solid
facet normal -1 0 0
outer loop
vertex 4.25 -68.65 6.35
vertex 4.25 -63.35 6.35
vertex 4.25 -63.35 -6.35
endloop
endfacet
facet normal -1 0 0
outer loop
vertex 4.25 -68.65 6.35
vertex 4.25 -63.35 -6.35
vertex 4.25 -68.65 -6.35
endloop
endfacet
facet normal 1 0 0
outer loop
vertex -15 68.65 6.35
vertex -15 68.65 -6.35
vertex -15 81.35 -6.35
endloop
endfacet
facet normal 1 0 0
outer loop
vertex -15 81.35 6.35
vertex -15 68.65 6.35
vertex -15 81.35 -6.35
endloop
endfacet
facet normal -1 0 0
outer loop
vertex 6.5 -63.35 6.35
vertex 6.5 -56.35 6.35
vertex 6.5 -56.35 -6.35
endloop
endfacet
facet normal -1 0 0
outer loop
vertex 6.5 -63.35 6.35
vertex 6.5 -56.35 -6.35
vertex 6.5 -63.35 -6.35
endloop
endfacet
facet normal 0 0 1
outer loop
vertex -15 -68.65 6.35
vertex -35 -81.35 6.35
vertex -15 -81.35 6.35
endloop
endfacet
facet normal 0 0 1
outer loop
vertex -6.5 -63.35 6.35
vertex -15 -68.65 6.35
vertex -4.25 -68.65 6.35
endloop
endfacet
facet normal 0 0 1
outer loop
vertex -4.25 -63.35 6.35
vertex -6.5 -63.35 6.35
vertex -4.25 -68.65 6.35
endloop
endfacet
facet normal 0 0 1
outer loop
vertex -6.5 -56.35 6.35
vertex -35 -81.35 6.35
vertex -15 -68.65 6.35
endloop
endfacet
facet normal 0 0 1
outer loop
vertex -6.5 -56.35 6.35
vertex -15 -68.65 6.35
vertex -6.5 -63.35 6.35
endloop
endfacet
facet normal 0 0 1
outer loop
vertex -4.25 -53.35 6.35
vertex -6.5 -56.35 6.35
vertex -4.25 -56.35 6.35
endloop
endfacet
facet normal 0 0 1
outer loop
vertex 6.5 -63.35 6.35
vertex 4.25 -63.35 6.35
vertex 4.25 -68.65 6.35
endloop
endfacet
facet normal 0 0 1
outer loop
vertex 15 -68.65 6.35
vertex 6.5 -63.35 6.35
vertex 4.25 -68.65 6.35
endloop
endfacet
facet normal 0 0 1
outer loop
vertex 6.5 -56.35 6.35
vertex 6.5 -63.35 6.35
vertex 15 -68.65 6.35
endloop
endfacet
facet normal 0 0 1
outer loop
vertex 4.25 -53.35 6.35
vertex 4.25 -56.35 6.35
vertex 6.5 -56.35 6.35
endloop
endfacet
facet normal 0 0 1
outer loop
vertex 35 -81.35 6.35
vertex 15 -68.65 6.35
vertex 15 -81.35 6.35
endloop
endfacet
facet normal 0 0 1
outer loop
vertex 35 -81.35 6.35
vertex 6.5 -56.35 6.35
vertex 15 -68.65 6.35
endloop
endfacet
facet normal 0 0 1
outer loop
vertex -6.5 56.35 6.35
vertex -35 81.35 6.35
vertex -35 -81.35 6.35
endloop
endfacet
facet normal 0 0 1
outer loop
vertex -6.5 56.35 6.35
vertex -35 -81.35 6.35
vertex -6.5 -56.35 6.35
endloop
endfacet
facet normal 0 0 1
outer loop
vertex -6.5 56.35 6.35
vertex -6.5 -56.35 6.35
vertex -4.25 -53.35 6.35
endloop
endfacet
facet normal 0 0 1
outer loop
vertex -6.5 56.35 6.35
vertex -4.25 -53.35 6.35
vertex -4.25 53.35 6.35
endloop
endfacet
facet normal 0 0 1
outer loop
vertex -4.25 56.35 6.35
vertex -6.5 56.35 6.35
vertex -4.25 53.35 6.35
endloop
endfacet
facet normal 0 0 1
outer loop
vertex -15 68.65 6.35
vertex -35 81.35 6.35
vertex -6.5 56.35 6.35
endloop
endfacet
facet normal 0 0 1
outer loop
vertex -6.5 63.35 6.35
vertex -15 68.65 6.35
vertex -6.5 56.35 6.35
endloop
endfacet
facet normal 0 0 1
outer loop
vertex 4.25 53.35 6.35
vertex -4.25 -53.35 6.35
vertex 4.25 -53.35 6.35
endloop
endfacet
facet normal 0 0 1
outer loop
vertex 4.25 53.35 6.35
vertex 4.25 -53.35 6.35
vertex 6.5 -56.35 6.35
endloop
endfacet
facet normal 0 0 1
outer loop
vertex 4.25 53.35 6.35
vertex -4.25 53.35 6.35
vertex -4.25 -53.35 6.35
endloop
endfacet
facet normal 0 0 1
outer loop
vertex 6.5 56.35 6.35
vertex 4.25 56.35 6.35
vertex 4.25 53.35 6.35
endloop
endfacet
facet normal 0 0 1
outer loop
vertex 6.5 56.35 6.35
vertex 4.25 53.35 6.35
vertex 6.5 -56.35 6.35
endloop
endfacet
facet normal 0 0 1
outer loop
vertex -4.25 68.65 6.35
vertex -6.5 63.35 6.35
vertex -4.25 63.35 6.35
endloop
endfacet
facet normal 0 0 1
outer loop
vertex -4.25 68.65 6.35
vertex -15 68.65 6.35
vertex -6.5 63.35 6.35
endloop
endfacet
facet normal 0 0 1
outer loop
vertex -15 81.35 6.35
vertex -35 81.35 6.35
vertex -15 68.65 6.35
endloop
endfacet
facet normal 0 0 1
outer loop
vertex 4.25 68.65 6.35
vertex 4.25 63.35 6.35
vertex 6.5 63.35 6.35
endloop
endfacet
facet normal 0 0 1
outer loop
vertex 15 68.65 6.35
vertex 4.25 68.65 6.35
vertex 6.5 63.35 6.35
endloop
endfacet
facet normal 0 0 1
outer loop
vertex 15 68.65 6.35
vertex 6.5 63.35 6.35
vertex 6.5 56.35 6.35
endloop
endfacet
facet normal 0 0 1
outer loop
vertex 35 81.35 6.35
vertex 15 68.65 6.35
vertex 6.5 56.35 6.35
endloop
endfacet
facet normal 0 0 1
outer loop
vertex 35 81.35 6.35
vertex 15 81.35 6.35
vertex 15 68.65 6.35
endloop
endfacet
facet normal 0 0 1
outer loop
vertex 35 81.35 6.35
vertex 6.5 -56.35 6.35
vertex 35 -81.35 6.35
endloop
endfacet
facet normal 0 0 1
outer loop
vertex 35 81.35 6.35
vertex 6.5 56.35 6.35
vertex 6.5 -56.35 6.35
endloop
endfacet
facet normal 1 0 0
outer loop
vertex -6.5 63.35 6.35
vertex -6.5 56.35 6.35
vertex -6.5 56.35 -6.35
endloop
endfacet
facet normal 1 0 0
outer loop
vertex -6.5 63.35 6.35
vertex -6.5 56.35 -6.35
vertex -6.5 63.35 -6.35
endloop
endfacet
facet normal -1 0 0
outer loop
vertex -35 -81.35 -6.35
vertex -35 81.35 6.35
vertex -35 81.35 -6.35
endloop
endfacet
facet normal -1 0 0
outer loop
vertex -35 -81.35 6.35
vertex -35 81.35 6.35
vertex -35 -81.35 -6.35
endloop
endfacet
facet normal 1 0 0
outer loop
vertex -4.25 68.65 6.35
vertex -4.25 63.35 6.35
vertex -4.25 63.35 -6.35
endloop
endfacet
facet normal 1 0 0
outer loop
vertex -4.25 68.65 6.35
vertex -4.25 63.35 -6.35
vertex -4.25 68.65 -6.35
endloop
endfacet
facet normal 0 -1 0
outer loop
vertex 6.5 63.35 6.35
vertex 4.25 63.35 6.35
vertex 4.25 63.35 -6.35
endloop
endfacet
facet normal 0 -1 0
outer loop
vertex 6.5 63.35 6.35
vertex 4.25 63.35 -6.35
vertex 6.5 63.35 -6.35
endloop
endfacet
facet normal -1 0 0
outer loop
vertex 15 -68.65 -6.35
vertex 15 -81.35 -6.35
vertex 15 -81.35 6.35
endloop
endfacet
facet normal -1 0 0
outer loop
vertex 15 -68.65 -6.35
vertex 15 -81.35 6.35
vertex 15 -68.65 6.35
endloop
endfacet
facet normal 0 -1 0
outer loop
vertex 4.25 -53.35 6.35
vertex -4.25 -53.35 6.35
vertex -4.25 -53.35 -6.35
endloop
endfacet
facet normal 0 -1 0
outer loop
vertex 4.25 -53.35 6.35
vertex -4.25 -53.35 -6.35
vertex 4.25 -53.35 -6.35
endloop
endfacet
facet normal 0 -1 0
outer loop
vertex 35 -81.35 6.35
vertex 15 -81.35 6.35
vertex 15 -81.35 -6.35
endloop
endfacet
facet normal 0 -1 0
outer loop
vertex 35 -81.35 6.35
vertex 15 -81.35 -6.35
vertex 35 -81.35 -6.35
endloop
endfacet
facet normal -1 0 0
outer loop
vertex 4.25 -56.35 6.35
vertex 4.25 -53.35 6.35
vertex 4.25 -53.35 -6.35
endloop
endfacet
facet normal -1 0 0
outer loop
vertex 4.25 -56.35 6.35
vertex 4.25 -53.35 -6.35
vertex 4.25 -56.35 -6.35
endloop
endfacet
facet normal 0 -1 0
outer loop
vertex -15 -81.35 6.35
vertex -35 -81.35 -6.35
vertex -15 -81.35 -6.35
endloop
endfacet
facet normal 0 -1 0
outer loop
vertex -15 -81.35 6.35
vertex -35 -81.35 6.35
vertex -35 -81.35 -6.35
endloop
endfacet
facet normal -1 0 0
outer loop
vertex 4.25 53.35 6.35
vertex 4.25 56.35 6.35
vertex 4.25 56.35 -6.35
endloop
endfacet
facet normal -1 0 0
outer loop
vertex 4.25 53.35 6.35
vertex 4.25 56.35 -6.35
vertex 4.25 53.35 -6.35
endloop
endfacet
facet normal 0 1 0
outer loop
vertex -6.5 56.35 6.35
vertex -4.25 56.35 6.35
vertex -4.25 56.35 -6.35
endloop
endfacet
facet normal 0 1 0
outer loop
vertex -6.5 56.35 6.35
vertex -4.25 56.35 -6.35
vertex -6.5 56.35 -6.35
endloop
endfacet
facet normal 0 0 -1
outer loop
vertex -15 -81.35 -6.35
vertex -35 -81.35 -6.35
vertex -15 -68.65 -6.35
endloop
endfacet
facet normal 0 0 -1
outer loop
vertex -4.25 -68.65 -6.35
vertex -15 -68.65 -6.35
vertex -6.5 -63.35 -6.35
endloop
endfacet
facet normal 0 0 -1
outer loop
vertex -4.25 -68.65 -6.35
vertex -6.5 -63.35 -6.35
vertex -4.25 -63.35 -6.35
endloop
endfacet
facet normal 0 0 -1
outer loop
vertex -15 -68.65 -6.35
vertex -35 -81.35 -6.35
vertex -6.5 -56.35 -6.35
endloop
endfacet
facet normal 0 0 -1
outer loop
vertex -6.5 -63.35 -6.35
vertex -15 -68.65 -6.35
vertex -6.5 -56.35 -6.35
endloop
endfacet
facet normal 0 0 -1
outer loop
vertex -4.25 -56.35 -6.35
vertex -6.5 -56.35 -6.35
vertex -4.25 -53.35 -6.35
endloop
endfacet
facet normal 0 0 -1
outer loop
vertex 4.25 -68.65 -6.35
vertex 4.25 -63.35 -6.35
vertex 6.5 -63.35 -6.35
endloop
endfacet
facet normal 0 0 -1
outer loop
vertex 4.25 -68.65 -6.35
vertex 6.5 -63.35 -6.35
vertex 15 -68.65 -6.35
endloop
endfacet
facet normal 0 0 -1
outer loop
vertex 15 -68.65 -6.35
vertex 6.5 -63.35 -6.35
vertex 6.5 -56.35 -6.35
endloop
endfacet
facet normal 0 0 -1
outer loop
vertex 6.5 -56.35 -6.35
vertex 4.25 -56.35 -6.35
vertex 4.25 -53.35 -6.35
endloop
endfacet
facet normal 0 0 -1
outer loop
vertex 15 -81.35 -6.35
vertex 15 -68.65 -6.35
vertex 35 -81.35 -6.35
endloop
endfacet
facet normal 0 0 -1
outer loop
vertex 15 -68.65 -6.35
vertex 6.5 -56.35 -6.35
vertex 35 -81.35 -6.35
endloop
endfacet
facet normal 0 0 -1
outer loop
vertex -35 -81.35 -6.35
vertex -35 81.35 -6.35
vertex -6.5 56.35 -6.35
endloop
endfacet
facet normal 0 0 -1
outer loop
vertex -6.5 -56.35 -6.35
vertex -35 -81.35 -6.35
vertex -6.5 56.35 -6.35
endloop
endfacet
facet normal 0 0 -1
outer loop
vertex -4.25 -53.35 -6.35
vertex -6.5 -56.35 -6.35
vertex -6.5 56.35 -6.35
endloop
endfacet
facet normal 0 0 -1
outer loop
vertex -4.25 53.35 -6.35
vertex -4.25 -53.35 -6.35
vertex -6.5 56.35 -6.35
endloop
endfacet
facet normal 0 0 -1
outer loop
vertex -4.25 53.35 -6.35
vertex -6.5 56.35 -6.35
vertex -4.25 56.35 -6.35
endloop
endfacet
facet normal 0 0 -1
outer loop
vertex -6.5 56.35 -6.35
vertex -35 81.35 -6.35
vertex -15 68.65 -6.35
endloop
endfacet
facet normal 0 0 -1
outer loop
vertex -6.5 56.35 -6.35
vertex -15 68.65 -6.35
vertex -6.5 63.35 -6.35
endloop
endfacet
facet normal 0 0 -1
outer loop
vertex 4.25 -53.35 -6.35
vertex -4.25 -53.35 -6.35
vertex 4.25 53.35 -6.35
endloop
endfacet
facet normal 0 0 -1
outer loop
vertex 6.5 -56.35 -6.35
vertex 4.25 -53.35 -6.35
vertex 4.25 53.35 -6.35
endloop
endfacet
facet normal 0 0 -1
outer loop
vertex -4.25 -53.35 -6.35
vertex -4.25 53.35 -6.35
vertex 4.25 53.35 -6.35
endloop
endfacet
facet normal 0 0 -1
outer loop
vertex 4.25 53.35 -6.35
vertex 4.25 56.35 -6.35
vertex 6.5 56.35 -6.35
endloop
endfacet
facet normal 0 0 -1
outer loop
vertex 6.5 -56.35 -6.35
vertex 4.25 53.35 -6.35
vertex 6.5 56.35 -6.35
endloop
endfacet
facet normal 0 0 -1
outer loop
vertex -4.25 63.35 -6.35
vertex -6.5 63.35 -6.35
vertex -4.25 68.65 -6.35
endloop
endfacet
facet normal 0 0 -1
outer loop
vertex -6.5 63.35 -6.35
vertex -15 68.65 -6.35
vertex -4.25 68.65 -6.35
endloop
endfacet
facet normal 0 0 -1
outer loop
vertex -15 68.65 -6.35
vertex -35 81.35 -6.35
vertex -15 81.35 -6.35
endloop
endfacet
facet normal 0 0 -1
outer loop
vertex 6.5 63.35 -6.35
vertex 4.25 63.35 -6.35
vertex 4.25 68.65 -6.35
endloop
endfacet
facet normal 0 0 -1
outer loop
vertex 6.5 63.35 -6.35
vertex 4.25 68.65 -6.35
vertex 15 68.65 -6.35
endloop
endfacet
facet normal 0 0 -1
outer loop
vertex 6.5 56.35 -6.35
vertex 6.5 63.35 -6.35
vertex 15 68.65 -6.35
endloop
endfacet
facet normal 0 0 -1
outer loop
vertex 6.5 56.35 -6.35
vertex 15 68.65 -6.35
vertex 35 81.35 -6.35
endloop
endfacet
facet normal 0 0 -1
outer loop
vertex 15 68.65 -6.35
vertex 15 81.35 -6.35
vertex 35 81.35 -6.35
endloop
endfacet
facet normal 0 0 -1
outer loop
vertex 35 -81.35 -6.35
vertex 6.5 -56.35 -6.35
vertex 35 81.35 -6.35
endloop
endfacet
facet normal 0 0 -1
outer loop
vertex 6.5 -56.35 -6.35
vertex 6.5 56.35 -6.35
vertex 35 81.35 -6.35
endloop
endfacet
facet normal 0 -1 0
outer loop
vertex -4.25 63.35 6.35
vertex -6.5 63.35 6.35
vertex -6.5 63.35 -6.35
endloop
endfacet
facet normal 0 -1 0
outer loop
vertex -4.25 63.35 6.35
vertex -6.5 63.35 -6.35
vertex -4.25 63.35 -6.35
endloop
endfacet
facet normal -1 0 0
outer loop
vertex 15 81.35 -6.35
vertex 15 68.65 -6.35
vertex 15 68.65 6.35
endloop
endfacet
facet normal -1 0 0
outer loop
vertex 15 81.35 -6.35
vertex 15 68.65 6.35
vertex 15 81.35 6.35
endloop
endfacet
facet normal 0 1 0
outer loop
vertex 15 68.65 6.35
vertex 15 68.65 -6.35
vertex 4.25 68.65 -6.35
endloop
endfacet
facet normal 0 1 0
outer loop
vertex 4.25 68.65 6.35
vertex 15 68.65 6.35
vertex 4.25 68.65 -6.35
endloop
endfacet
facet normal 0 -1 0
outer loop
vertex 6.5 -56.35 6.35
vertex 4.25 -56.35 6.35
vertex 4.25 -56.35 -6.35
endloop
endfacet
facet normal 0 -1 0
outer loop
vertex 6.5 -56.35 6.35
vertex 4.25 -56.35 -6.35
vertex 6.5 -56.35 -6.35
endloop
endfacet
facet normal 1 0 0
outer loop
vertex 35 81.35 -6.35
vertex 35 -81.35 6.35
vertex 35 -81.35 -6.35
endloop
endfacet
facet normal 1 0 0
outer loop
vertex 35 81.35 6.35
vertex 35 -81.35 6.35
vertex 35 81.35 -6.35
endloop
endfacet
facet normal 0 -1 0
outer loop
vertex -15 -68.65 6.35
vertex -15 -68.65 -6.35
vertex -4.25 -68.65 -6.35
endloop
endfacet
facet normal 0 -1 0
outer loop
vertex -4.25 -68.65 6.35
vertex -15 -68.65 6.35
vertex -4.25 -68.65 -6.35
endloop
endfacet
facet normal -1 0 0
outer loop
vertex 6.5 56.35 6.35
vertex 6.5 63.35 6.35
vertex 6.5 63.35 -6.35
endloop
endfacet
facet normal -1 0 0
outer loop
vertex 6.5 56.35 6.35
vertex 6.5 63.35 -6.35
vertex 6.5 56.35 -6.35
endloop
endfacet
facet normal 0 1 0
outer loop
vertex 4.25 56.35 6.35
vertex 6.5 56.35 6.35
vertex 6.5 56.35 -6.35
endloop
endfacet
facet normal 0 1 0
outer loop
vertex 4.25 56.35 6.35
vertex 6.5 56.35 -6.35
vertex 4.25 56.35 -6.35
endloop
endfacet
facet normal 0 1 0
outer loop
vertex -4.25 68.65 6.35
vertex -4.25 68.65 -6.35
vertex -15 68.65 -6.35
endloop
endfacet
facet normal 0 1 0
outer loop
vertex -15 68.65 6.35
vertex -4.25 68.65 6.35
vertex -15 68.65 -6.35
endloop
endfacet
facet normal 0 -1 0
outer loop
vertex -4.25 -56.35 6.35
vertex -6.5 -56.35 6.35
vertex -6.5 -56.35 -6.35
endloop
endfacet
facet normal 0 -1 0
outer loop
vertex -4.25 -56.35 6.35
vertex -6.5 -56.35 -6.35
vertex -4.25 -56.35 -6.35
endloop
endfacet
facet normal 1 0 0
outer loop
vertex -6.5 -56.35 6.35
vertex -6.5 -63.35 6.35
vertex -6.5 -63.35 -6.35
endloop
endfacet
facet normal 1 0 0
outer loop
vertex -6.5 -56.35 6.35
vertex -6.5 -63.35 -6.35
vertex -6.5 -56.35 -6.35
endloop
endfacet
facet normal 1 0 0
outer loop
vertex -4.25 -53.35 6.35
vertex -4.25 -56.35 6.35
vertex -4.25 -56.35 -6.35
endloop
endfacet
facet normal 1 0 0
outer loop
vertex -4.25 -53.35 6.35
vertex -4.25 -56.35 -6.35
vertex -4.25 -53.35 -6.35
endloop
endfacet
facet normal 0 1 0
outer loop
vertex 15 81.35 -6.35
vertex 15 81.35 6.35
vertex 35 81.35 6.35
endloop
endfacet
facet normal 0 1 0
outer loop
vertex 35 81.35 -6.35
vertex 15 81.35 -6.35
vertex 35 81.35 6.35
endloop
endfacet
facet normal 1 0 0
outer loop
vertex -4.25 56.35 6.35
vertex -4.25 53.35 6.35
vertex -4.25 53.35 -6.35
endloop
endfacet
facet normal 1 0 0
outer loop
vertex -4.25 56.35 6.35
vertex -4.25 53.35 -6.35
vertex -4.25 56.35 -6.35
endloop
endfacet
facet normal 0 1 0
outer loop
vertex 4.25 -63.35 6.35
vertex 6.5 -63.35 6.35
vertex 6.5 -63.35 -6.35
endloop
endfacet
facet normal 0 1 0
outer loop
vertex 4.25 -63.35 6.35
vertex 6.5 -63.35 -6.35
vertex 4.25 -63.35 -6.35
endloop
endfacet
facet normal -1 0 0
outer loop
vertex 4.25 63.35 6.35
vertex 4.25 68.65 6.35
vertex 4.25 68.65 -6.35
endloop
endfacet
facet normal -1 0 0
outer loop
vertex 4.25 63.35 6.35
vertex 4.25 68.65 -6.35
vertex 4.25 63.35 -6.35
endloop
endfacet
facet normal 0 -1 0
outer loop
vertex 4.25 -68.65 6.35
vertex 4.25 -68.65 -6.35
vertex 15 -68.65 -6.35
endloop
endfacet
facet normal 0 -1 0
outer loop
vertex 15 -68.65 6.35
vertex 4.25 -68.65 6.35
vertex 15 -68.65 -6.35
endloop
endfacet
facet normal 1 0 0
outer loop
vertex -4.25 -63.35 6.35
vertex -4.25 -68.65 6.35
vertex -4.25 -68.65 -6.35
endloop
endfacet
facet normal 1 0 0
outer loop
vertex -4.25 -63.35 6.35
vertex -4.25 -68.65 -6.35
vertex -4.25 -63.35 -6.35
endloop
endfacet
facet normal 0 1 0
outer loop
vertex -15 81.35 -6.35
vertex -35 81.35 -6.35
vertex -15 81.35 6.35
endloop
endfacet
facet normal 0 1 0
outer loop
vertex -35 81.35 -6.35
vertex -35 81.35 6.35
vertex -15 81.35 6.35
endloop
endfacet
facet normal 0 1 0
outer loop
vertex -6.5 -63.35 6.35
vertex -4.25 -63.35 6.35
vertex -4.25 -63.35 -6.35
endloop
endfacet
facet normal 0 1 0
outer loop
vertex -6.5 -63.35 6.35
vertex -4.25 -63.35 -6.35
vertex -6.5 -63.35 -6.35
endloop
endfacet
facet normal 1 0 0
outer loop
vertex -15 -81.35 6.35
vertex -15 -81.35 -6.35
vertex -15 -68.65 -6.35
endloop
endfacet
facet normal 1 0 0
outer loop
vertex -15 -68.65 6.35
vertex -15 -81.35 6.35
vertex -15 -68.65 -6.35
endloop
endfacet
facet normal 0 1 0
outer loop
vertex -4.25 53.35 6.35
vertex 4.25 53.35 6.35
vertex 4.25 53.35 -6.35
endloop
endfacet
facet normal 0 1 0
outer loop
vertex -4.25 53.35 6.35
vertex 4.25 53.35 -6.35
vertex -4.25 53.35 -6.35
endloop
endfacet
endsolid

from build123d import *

# Parameters (mm, degrees)
SKETCH1_W           = 20
SKETCH1_H           = 12.7
BOSS_EXTRUDE1_DEPTH = 6.35


with BuildPart() as part:
    # Sketch1 → Boss-Extrude1 (new, symmetric)
    with BuildSketch(Plane.XY):
        Polygon((-35, 68.65), (-35, -68.65), (-15, -68.65), (-4.25, -68.65), (-4.25, -63.35), (-6.5, -63.35), (-6.5, -56.35), (-4.25, -56.35), (-4.25, -53.35), (4.25, -53.35), (4.25, -56.35), (6.5, -56.35), (6.5, -63.35), (4.25, -63.35), (4.25, -68.65), (15, -68.65), (35, -68.65), (35, 68.65), (15, 68.65), (4.25, 68.65), (4.25, 63.35), (6.5, 63.35), (6.5, 56.35), (4.25, 56.35), (4.25, 53.35), (-4.25, 53.35), (-4.25, 56.35), (-6.5, 56.35), (-6.5, 63.35), (-4.25, 63.35), (-4.25, 68.65), (-15, 68.65), align=None)
        with Locations((-25, -75)):
            Rectangle(SKETCH1_W, SKETCH1_H)
        with Locations((25, -75)):
            Rectangle(SKETCH1_W, SKETCH1_H)
        with Locations((25, 75)):
            Rectangle(SKETCH1_W, SKETCH1_H)
        with Locations((-25, 75)):
            Rectangle(SKETCH1_W, SKETCH1_H)
    extrude(amount=BOSS_EXTRUDE1_DEPTH, both=True)


solid = part.part
